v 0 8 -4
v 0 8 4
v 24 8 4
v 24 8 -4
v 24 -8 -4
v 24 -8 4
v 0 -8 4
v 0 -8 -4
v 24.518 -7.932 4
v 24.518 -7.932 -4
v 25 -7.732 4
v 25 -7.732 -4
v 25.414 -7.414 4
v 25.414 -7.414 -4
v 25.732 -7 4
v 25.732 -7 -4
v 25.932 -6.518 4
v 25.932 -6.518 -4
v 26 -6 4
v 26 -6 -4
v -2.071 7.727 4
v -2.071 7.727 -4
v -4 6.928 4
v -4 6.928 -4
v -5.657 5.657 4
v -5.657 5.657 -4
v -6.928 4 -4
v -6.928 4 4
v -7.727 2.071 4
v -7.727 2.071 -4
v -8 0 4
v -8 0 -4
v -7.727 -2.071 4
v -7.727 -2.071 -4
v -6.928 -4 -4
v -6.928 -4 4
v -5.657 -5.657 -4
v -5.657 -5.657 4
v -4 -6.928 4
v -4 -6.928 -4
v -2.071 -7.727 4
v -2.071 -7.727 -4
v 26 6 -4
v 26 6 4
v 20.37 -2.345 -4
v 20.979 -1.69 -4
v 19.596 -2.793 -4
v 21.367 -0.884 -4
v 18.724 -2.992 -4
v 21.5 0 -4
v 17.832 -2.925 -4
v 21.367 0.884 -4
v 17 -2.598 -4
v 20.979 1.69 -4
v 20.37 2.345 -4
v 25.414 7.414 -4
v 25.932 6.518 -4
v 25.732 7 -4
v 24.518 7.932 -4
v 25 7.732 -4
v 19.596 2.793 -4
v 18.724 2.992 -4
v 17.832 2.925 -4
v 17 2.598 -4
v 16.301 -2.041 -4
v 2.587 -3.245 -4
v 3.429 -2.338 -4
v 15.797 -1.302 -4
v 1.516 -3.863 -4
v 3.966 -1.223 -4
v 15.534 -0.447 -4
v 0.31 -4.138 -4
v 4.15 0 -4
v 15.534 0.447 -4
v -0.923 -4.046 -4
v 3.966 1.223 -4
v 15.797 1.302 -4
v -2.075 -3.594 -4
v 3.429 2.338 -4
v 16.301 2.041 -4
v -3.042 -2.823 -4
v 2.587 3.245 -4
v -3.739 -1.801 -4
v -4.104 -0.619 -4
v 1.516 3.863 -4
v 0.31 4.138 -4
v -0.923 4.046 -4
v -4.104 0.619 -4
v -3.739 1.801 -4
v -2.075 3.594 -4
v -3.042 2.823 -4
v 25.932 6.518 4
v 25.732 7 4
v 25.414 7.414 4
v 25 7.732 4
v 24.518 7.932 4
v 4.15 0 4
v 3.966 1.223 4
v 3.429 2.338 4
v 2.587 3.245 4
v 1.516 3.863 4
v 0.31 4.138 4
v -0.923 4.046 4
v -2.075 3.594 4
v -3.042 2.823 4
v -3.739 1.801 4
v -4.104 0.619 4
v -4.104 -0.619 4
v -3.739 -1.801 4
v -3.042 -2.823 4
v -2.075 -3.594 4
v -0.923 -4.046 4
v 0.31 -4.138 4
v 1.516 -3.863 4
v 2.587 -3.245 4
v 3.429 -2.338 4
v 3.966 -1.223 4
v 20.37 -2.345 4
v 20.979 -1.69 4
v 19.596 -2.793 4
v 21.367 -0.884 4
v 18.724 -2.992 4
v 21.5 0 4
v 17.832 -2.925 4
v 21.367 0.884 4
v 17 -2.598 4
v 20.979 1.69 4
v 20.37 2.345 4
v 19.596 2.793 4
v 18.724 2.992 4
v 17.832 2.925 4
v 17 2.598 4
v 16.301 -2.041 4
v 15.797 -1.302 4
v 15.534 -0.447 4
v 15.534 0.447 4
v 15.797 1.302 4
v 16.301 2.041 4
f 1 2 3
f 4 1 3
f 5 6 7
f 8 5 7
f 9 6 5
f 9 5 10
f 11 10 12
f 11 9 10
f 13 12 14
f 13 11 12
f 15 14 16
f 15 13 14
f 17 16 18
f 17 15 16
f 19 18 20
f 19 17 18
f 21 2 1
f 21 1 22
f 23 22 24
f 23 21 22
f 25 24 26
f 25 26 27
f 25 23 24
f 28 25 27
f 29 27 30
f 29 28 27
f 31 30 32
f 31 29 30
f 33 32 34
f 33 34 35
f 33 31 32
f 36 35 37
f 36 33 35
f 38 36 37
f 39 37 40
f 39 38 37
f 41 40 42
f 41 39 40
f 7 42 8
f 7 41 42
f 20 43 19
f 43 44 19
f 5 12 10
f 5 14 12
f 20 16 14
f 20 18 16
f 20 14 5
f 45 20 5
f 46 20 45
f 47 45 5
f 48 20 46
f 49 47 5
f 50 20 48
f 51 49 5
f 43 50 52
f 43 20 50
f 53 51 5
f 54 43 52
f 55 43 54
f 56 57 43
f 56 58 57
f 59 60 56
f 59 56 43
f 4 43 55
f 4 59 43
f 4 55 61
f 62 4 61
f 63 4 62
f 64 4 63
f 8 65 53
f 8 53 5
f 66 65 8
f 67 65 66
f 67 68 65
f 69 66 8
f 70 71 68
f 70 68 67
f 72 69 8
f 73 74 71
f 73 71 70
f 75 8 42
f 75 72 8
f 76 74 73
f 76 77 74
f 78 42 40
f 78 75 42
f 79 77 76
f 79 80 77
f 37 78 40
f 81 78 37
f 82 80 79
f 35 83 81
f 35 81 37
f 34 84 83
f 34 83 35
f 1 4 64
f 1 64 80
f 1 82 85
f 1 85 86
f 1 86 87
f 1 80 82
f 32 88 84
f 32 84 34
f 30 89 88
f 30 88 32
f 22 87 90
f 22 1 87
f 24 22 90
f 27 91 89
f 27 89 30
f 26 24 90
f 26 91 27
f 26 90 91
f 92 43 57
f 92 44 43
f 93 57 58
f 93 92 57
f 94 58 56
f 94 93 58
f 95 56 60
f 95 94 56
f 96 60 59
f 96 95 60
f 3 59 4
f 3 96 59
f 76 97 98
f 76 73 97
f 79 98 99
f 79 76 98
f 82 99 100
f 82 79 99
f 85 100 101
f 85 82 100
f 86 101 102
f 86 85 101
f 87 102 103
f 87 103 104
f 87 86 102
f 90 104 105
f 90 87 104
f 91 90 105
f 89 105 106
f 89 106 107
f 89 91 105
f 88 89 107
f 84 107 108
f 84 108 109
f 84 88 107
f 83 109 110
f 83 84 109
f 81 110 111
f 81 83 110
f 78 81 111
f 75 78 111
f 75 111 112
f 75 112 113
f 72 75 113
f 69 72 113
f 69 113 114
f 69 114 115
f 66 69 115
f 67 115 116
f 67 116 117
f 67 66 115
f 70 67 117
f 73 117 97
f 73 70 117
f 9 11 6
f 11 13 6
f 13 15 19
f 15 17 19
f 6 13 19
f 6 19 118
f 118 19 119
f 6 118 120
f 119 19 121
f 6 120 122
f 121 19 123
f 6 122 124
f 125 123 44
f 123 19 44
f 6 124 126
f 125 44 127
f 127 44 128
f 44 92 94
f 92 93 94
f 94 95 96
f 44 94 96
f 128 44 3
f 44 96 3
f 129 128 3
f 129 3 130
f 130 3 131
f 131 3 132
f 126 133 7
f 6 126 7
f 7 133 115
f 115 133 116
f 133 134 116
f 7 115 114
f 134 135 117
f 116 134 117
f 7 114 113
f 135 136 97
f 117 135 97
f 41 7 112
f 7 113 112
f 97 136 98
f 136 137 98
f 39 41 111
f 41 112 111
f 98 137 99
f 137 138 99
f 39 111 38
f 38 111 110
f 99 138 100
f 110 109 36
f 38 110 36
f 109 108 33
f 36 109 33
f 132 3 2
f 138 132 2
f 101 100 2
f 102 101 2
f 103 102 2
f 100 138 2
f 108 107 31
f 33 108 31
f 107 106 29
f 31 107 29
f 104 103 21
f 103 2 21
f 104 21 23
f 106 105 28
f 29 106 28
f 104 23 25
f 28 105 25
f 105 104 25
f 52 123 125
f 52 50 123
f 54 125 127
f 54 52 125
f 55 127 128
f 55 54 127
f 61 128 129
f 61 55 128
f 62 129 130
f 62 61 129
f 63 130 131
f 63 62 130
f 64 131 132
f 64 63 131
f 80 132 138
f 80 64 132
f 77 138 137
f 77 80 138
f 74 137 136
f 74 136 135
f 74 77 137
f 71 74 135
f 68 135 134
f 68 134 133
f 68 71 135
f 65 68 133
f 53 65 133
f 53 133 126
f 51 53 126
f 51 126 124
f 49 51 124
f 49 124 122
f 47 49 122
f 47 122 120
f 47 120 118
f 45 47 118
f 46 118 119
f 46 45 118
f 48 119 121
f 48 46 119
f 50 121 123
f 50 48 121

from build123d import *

# Parameters (mm, degrees)
SKETCH_R   = 3
SKETCH_R_2 = 4.15
PAD_DEPTH  = 4


with BuildPart() as part:
    # Sketch → Pad (new body, symmetric)
    with BuildSketch(Plane.XY):
        with BuildLine():
            Line((0, 8), (24, 8))
            ThreePointArc((26, 6), (25.414214, 7.414214), (24, 8))
            Line((26, 6), (26, -6))
            ThreePointArc((24, -8), (25.414214, -7.414214), (26, -6))
            Line((24, -8), (0, -8))
            ThreePointArc((0, 8), (-8, 0), (0, -8))
        make_face()
        with Locations((18.5, 0)):
            Circle(SKETCH_R, mode=Mode.SUBTRACT)
        Circle(SKETCH_R_2, mode=Mode.SUBTRACT)
    extrude(amount=PAD_DEPTH, both=True)


solid = part.part
